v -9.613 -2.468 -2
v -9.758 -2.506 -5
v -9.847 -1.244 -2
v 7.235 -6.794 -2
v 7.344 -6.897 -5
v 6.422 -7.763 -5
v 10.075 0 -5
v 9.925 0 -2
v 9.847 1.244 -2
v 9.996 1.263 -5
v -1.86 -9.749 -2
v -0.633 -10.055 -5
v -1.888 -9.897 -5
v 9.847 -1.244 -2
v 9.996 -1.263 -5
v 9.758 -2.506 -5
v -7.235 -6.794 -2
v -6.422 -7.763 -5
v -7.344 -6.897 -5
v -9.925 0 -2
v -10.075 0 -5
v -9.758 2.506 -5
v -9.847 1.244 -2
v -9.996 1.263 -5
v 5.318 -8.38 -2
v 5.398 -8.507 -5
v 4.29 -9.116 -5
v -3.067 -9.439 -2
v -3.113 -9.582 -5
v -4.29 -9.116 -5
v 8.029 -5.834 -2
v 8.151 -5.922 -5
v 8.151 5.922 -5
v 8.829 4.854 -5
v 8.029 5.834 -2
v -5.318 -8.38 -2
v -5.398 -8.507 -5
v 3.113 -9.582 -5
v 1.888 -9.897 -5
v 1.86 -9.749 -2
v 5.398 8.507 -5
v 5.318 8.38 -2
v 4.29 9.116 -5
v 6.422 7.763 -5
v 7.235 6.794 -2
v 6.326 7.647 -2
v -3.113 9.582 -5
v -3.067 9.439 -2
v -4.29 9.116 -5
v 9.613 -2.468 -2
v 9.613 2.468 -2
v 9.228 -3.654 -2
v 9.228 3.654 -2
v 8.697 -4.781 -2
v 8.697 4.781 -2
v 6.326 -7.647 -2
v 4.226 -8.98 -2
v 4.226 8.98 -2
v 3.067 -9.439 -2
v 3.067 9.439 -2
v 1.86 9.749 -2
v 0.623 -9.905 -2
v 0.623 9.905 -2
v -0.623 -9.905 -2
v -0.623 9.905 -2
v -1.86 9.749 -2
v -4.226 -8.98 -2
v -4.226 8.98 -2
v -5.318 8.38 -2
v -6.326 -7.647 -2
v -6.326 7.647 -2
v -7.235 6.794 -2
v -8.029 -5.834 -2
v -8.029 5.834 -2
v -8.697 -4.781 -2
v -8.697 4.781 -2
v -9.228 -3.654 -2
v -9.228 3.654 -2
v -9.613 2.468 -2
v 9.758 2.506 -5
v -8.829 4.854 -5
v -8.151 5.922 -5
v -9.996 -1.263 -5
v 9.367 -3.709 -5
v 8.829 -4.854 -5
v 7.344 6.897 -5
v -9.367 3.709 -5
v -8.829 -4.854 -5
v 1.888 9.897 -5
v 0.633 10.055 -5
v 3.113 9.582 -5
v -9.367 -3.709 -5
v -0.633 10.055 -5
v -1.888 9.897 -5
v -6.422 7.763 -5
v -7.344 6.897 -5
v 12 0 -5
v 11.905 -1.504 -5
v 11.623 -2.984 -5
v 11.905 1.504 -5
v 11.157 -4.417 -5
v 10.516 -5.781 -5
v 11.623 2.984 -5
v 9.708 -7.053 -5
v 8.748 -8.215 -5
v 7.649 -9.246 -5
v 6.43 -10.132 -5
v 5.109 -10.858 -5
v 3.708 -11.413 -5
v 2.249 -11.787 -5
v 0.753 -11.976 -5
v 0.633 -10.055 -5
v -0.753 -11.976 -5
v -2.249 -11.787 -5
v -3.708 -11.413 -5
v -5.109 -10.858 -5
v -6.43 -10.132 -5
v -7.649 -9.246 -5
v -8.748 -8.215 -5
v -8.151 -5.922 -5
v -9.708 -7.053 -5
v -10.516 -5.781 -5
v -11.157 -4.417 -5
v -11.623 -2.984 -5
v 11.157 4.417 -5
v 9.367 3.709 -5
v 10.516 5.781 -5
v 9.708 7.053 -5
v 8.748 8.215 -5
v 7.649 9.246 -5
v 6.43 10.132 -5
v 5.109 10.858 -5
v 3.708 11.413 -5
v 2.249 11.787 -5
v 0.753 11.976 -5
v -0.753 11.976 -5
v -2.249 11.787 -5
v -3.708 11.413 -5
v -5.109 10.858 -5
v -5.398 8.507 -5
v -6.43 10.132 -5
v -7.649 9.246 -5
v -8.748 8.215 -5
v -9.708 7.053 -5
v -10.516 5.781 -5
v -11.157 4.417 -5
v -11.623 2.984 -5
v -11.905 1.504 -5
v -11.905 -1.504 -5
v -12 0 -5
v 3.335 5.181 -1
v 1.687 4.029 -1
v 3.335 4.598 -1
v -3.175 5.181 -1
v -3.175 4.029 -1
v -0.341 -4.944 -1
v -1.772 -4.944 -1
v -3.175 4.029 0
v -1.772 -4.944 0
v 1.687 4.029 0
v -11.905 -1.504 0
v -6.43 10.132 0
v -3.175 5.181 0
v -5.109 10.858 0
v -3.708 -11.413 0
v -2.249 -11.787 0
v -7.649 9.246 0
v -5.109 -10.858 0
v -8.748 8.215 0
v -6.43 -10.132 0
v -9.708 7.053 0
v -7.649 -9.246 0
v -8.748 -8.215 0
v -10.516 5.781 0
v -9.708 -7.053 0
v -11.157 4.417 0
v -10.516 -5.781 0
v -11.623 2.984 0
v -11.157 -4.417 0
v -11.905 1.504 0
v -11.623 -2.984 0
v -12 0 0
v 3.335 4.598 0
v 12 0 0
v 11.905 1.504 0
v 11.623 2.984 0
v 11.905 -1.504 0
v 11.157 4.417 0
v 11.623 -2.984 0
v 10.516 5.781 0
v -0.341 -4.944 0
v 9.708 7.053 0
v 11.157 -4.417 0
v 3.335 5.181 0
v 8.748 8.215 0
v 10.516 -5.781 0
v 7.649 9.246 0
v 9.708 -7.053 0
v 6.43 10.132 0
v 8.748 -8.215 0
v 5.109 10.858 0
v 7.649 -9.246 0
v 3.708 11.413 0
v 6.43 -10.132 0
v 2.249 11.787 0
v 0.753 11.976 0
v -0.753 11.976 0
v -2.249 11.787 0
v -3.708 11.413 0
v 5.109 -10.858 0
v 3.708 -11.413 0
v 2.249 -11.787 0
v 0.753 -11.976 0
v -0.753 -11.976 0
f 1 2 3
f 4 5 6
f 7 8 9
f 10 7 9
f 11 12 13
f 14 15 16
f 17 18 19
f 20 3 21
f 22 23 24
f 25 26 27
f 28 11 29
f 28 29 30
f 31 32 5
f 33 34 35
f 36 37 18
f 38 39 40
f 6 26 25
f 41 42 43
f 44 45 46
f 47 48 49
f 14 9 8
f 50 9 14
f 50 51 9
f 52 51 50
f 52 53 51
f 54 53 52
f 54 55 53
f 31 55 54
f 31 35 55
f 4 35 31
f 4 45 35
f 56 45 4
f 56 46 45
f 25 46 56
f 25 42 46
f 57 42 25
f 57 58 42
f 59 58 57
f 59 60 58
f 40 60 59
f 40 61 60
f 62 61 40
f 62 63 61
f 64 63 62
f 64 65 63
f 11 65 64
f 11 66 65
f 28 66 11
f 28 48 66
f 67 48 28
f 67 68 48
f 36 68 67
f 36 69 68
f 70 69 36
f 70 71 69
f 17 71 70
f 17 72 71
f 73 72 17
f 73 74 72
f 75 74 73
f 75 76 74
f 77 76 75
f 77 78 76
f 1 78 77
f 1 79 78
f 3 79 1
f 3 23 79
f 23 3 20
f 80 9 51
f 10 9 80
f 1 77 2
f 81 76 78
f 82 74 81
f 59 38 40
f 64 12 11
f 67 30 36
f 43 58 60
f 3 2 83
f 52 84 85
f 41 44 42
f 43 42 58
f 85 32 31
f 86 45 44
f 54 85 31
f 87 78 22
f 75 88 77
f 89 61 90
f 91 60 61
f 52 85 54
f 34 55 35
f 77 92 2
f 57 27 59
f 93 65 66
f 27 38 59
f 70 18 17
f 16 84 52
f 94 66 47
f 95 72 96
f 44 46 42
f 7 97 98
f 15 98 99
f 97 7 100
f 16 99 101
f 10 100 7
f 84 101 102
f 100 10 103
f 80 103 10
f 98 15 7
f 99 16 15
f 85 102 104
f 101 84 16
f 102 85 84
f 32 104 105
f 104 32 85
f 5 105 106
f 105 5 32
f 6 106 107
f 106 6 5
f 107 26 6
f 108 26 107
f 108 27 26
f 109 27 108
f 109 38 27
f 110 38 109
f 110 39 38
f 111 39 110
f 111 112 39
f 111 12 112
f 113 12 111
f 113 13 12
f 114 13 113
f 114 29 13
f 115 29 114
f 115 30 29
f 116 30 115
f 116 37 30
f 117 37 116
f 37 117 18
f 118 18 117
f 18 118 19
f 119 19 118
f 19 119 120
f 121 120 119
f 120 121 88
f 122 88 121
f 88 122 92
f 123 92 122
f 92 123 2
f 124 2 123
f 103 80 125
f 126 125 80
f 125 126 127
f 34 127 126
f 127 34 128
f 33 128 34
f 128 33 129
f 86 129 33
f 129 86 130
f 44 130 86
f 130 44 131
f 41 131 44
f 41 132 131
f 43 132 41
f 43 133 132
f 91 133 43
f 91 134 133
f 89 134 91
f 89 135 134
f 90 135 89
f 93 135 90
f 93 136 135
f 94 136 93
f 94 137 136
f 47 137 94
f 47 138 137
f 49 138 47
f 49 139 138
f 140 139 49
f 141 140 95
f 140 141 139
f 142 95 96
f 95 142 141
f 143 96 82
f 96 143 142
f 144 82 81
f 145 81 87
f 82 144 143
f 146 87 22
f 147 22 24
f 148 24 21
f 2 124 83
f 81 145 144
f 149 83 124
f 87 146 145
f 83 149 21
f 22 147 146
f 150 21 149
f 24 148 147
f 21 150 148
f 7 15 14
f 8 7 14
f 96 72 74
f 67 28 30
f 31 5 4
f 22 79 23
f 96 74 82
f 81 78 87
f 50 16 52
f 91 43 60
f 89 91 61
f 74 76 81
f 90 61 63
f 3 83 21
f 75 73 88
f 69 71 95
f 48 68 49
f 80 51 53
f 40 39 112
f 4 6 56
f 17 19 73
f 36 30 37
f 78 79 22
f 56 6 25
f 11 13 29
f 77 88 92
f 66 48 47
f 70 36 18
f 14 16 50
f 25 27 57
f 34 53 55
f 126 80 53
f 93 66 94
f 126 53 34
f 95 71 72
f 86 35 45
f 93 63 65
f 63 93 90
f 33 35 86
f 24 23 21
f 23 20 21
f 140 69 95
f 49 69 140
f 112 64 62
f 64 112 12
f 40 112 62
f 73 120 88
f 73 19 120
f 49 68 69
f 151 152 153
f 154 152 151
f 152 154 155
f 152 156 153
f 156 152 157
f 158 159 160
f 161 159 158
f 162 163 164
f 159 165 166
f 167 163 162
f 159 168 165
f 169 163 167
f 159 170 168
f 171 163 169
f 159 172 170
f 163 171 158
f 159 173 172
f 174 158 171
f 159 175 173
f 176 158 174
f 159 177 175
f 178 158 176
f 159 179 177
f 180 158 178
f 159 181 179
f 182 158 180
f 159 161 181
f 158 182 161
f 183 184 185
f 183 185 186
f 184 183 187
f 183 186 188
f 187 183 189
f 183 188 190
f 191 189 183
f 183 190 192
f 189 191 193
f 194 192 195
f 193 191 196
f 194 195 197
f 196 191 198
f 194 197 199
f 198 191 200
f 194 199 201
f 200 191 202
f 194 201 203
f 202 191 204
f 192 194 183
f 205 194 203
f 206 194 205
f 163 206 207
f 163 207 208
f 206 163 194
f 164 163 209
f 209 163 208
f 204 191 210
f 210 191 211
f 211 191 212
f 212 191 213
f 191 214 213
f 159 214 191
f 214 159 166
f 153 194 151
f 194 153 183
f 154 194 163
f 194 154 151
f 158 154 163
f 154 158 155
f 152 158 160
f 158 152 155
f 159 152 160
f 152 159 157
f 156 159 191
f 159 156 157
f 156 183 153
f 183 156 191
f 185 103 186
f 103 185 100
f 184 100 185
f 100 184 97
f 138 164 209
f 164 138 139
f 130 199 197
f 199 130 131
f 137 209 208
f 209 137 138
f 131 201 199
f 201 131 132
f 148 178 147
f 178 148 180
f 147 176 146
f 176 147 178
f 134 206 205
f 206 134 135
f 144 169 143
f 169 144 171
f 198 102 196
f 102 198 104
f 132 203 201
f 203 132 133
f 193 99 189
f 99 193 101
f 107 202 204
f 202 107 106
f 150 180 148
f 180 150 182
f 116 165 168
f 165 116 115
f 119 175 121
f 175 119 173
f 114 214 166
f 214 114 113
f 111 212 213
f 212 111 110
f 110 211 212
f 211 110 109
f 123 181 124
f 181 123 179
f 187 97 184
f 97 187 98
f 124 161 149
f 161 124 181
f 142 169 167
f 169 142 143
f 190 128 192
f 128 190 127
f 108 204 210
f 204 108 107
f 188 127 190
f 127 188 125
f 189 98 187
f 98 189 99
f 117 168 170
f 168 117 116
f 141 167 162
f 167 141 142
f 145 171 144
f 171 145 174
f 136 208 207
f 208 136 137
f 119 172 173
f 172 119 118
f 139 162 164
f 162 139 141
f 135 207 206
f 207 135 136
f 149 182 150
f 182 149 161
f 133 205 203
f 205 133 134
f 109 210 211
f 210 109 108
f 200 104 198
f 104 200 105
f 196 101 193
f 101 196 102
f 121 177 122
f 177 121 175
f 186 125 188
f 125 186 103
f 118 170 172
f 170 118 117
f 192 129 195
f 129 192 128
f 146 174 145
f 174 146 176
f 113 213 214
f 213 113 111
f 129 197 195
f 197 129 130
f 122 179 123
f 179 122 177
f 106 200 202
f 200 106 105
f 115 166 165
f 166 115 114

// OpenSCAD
$fn = 50;

difference() {
	union() {
		translate(v = [0, 0, -5.0]) {
			cylinder(h = 5, r = 12.0);
		}
	}
	union() {
		#translate(v = [0, 0, -5.0]) {
			cylinder(h = 3, r1 = 10.075, r2 = 9.925);
		}
		translate(v = [0, 0, -1]) {
			linear_extrude(height = 1) {
				text(font = "Impact", halign = "center", size = 10, text = "7", valign = "center");
			}
		}
	}
}
